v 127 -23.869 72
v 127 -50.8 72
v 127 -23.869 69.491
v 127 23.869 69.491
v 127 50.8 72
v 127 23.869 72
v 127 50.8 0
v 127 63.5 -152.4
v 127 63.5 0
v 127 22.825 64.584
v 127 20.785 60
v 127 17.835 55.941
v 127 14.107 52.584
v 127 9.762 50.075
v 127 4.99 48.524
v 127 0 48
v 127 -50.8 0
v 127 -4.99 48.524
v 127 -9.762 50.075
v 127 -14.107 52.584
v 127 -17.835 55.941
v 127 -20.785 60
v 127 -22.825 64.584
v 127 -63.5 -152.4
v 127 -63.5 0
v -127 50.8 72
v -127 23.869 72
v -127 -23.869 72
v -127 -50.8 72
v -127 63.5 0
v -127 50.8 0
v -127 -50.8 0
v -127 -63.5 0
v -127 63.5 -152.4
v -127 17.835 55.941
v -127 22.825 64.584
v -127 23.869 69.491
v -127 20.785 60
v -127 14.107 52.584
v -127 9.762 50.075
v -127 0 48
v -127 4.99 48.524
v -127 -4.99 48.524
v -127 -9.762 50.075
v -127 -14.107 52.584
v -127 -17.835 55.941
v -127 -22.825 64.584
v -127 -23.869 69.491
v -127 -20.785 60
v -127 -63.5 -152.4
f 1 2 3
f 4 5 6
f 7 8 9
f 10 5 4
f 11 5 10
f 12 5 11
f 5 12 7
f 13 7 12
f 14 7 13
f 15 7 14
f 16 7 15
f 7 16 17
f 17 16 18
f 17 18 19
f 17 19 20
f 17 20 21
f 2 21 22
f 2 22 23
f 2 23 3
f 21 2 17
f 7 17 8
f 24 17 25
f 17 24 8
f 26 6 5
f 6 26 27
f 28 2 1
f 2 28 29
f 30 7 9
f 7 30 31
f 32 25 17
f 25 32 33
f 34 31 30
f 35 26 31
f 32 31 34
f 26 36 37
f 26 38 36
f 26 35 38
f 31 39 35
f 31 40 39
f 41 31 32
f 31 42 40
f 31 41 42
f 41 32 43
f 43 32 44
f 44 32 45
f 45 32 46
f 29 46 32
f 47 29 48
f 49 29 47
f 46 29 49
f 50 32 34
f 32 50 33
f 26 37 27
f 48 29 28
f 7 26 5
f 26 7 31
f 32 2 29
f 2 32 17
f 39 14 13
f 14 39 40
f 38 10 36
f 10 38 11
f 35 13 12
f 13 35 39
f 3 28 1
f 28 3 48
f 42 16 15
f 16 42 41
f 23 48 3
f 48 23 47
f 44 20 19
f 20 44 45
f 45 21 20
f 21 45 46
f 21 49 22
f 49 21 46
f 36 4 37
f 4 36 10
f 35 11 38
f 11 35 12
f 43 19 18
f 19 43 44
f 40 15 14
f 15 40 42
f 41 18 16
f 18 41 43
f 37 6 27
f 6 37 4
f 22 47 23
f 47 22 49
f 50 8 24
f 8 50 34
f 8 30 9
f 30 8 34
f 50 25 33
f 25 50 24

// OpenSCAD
mms=25.4;

module main_block(height, width, length, thick, tube_d){
    translate([0,0,height/2+(tube_d/4)]){
	   difference(){
	       cube([length, width, height+(tube_d/2)], center=true);
        translate([0,0,height/2+tube_d/4]){
            rotate([0,90,0]){
                cylinder(h=length*2, d=tube_d, center=true);
            }
        }
    }
    }
    translate([0,0,-thick]){
    			 cube([length, width*1.25, thick*2], center=true);
    }
}
;
tube_d = 48;
height = 48;
length = 10*mms;
width = 4*mms;
thick = 3*mms;

main_block(height, width, length, thick, tube_d); 
